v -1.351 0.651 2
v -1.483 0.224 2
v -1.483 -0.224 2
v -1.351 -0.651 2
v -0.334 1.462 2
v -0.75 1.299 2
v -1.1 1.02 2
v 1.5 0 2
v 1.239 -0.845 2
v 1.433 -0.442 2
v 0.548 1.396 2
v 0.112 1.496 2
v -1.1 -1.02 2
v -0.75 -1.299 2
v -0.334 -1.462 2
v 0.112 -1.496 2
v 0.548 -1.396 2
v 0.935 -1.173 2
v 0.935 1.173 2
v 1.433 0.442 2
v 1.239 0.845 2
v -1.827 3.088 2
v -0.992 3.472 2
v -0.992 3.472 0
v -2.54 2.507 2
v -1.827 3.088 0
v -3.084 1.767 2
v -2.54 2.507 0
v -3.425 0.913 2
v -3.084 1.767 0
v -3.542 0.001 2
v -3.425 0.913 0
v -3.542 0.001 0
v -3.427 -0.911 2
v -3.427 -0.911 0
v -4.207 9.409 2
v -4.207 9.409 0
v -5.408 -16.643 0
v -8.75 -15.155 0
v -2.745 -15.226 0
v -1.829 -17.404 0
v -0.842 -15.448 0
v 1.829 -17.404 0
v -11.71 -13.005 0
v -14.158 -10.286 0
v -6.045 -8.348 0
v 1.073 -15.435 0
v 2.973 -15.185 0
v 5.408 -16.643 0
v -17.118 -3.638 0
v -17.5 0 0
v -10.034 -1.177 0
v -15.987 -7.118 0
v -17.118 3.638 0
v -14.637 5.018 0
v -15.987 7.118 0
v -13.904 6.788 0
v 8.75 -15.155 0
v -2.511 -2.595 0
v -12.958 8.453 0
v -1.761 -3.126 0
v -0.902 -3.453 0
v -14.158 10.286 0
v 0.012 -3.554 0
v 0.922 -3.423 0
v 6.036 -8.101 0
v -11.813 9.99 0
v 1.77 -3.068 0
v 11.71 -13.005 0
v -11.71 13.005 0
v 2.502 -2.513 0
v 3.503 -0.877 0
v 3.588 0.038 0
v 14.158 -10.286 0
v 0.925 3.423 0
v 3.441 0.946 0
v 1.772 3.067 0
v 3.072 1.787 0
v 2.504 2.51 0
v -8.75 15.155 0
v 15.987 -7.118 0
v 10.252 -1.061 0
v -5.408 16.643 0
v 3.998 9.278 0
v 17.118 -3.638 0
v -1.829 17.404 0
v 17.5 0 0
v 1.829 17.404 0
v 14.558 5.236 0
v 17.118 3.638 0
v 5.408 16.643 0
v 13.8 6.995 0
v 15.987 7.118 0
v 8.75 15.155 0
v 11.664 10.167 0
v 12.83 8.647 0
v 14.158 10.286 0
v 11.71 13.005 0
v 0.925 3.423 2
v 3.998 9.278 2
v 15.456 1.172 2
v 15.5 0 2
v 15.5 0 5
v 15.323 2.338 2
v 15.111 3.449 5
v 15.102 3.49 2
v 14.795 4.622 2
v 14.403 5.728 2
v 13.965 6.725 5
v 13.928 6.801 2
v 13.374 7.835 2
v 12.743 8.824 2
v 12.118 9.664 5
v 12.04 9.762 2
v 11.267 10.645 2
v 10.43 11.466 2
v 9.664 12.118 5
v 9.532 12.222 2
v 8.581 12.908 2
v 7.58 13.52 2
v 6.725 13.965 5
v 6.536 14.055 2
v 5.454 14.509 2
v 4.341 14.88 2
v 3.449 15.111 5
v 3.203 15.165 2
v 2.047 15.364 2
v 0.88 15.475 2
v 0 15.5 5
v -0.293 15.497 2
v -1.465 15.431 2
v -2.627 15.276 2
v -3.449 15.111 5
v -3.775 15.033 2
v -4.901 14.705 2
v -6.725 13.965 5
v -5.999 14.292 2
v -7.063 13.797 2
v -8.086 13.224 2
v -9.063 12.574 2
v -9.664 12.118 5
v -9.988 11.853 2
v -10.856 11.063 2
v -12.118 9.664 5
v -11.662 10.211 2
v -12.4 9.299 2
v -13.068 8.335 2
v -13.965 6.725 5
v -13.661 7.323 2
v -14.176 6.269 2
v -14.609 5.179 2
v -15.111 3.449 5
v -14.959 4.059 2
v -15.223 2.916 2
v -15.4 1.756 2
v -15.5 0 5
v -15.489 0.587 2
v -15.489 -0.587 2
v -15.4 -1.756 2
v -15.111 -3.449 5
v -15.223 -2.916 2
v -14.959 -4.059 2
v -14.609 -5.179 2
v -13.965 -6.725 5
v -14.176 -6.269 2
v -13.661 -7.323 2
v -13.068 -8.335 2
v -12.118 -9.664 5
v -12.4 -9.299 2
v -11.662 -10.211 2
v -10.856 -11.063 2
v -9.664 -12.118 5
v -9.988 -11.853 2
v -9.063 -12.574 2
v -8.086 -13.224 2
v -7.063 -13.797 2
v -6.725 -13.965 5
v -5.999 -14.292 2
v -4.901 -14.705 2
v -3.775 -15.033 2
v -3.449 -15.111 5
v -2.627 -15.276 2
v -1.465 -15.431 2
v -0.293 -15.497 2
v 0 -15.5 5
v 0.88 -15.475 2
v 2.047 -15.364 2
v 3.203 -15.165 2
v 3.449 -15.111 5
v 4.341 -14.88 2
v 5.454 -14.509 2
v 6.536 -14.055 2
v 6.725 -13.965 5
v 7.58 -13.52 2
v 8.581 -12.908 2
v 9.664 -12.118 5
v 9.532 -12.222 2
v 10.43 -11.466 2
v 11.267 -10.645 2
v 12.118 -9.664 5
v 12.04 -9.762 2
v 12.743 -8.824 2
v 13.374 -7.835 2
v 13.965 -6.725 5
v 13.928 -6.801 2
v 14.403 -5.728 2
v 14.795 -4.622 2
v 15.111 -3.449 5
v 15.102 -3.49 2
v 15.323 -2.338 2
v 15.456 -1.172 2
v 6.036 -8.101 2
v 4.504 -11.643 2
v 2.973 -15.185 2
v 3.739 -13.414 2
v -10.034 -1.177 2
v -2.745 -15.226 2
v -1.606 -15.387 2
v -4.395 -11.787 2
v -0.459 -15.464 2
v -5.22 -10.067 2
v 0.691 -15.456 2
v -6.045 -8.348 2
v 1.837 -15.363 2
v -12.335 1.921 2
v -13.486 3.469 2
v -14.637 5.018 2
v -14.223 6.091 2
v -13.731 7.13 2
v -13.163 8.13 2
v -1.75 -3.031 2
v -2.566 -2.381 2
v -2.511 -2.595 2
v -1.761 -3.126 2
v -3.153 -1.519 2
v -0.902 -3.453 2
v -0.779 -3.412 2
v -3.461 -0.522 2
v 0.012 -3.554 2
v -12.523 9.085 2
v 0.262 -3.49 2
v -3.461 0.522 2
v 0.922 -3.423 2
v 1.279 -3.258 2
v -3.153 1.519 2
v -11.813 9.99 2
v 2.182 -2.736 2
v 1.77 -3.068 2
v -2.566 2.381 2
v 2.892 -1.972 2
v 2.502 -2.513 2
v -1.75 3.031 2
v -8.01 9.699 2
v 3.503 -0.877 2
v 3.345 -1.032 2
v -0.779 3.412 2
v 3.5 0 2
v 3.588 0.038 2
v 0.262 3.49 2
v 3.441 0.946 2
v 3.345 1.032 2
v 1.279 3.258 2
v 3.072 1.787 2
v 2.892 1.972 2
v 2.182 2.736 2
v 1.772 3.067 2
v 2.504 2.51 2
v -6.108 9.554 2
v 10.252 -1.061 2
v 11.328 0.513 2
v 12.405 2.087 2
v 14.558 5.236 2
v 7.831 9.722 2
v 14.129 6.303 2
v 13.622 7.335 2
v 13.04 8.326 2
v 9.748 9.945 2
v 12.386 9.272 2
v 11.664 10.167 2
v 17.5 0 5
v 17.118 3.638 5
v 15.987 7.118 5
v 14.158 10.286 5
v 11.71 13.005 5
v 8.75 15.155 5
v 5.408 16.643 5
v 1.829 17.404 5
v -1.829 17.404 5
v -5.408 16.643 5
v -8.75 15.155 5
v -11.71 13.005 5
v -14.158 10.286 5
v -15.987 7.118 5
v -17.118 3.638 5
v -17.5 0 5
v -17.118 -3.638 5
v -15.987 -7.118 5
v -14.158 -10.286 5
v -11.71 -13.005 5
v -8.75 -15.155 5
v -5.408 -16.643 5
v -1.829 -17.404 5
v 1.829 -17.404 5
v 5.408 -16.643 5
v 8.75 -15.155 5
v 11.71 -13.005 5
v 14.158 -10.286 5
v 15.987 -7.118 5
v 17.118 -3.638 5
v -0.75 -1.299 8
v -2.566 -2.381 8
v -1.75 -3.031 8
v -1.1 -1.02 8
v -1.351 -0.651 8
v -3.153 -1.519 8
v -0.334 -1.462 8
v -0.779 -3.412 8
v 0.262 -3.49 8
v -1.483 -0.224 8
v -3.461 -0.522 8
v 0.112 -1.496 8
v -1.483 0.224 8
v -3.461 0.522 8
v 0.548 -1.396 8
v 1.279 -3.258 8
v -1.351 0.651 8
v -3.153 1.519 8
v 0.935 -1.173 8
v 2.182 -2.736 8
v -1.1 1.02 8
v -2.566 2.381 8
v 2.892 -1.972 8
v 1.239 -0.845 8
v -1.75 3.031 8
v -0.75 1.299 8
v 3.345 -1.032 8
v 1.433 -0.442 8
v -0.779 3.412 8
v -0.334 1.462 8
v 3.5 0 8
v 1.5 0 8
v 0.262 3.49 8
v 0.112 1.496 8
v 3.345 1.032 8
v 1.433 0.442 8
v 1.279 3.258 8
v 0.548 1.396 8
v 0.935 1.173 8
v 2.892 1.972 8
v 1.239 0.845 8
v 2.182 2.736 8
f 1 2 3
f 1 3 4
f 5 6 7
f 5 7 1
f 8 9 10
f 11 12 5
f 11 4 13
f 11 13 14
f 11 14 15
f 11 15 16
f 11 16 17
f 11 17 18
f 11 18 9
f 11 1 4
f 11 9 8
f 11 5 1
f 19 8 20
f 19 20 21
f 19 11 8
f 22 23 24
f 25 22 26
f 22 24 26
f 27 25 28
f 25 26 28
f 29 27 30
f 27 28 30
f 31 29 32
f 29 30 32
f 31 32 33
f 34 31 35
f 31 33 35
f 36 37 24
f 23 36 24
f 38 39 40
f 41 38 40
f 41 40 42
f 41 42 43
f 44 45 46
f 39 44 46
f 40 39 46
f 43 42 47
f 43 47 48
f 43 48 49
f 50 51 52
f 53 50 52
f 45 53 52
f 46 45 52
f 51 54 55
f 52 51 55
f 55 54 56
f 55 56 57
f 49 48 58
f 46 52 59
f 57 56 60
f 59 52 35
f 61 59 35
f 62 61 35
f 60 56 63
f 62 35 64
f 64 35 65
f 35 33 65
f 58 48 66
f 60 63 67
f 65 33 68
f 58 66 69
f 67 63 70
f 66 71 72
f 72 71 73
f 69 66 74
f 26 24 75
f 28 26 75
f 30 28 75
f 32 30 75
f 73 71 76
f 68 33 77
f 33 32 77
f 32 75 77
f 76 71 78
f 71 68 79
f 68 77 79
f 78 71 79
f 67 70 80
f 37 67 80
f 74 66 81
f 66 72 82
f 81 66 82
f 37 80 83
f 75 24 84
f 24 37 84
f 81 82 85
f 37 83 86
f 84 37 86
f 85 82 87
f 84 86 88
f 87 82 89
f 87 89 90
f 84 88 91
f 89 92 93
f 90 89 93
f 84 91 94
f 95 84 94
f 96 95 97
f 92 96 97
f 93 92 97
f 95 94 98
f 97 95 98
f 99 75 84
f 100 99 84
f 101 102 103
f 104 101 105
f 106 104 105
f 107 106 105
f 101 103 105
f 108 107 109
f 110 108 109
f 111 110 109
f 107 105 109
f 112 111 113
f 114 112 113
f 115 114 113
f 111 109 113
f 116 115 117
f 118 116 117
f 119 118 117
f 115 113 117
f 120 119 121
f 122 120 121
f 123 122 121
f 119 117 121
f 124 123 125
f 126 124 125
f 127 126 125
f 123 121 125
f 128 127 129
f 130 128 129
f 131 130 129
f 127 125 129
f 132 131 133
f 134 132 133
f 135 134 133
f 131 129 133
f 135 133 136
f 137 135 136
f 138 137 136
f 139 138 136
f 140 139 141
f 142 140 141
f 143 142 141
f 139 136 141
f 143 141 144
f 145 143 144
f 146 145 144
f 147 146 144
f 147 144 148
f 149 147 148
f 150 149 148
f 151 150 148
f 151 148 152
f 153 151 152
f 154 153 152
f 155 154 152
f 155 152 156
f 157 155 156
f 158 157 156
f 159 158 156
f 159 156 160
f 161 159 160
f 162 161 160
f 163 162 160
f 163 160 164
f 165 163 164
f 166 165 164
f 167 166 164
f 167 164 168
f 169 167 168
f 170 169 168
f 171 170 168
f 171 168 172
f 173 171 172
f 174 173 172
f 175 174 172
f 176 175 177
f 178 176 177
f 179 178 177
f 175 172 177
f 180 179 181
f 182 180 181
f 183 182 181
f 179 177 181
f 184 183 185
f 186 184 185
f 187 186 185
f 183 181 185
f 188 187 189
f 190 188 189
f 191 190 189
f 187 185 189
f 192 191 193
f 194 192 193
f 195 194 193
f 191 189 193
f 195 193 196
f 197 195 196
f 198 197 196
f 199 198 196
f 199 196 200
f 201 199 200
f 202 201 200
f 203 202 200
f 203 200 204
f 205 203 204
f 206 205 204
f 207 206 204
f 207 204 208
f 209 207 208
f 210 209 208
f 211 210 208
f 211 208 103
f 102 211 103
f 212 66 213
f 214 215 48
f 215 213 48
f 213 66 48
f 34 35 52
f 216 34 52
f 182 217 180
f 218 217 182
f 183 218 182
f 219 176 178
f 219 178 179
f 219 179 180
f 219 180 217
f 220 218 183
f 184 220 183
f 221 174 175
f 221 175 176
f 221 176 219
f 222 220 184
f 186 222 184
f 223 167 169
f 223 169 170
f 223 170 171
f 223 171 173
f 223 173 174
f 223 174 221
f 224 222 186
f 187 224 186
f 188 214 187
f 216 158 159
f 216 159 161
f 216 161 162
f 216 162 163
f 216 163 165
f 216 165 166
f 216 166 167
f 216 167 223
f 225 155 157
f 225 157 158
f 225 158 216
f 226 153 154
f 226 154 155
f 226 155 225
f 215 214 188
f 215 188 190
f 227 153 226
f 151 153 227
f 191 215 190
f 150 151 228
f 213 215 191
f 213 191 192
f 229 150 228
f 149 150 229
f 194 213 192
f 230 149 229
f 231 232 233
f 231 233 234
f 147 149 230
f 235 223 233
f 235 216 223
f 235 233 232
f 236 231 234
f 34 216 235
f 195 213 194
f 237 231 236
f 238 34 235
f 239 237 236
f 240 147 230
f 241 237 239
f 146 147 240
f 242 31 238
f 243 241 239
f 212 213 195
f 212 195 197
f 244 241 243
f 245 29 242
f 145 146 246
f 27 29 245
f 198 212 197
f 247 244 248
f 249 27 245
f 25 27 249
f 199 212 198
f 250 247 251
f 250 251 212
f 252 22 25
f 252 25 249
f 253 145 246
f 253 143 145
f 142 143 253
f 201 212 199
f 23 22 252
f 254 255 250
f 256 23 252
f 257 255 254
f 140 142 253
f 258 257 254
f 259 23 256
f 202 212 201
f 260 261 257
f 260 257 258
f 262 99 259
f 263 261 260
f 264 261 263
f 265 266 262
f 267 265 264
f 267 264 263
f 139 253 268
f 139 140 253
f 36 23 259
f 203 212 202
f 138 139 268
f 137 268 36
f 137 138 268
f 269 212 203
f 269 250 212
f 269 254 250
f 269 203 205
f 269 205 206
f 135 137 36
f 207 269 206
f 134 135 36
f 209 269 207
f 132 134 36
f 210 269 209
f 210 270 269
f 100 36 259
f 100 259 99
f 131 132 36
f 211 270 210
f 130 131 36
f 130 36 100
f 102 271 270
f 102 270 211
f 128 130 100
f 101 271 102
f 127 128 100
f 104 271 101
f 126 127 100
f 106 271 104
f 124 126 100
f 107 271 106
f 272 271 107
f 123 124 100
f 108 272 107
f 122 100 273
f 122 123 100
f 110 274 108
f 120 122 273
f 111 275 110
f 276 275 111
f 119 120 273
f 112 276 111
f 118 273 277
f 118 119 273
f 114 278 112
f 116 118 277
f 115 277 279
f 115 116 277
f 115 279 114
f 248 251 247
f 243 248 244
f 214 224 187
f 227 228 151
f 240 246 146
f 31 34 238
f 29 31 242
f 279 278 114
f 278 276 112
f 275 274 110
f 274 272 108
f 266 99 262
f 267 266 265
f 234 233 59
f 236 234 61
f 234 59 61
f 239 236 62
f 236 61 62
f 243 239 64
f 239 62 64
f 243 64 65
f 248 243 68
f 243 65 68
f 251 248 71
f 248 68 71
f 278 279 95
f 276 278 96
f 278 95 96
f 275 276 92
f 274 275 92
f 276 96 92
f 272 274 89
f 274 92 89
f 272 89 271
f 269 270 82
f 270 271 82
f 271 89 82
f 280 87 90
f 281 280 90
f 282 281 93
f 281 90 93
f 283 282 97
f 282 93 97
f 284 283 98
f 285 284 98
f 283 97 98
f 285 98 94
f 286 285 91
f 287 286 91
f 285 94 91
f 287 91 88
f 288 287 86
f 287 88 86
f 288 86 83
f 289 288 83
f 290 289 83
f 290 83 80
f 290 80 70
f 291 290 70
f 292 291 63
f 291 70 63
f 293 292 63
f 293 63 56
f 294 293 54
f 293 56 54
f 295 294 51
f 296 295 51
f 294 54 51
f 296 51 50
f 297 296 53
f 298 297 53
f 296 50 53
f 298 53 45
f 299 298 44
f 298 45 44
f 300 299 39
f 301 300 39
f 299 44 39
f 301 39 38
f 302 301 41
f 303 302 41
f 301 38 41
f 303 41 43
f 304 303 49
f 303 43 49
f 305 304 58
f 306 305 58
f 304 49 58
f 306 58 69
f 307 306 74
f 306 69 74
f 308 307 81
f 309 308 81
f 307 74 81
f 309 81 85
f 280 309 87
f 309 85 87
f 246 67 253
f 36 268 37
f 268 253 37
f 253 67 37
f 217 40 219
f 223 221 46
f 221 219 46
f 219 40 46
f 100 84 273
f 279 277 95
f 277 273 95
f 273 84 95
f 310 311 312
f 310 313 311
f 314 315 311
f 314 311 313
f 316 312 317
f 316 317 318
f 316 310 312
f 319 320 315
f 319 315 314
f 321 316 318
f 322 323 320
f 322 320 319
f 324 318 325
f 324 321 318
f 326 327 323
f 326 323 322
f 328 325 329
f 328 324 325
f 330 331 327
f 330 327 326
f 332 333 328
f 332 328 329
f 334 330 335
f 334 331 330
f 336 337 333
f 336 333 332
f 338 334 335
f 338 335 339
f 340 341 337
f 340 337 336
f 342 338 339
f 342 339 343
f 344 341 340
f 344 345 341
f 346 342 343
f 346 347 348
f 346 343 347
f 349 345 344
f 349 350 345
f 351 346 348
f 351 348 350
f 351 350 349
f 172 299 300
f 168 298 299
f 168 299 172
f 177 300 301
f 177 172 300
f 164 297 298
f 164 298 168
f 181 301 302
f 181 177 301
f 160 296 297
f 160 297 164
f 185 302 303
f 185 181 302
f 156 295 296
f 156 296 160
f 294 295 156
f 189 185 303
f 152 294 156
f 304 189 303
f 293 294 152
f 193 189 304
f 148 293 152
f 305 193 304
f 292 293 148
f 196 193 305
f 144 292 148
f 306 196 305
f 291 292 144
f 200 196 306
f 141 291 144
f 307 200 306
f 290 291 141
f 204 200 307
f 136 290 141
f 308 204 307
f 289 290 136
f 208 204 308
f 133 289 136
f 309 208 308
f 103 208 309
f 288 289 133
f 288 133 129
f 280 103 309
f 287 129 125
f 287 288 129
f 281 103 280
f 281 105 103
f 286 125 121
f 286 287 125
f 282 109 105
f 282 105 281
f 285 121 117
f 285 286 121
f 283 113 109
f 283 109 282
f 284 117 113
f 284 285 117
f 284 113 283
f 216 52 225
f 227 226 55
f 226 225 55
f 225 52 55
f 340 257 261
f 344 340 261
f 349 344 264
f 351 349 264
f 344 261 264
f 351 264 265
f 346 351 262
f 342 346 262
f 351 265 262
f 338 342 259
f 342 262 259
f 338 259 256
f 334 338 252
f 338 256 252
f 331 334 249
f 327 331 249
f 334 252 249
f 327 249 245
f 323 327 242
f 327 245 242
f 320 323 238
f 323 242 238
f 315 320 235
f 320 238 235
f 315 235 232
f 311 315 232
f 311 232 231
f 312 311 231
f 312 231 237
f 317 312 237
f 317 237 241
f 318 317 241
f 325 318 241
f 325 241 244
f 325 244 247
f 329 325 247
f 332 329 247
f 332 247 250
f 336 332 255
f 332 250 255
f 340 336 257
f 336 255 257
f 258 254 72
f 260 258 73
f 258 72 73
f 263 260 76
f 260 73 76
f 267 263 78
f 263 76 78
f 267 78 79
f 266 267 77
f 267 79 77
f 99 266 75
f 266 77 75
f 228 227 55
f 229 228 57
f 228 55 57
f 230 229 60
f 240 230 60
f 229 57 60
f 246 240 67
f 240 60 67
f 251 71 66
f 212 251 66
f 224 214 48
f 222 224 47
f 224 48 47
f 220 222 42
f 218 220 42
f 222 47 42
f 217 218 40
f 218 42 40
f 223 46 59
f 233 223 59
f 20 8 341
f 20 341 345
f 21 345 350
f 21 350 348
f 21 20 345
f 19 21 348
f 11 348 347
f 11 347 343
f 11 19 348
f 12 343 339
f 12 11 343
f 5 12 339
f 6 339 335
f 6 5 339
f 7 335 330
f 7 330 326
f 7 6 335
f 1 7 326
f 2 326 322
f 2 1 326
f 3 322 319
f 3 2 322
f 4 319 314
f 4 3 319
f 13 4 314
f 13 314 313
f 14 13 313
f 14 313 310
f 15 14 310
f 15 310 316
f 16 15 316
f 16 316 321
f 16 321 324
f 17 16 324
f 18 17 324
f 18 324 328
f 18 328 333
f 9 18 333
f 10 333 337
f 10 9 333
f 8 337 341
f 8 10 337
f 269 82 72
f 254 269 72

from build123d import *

# Parameters (mm, degrees)
F0_R     = 17.5
F1_DEPTH = 5
F2_R     = 15.5
F3_DEPTH = 3
F4_R     = 3.5
F4_R_2   = 1.5
F5_DEPTH = 6
F8_DEPTH = 25


with BuildPart() as f1:
    # F0 (on Top) → F1 (new body)
    with BuildSketch(Plane.XY):
        Circle(F0_R)
    extrude(amount=F1_DEPTH)

    # F2 (on face) → F3 (cut)
    with BuildSketch(Plane.XY.offset(5)):
        Circle(F2_R)
    extrude(amount=-F3_DEPTH, mode=Mode.SUBTRACT)

    # F4 (on face) → F5 (join)
    with BuildSketch(Plane.XY.offset(2)):
        Circle(F4_R)
        Circle(F4_R_2, mode=Mode.SUBTRACT)
    extrude(amount=F5_DEPTH)

    # F7 (on face) → F8 (cut)
    with BuildSketch(Plane(origin=(0, 0, 0), x_dir=(1, 0, 0), z_dir=(0, 0, -1))):
        with BuildLine():
            ThreePointArc((-2.510914, 2.59477), (0.012059, 3.554075), (2.502232, 2.512588))
            Line((2.502232, 2.512588), (6.036088, 8.101013))
            Line((6.036088, 8.101013), (2.972662, 15.185164))
            ThreePointArc((2.972662, 15.185164), (0.115894, 15.47105), (-2.744629, 15.22557))
            Line((-2.744629, 15.22557), (-6.044772, 8.347561))
            Line((-6.044772, 8.347561), (-2.510914, 2.59477))
        make_face()
        with BuildLine():
            Line((-3.427081, 0.910703), (-10.033727, 1.1769))
            Line((-10.033727, 1.1769), (-14.637069, -5.018181))
            ThreePointArc((-14.637069, -5.018181), (-13.456269, -7.635157), (-11.813416, -9.989703))
            Line((-11.813416, -9.989703), (-4.206814, -9.408706))
            Line((-4.206814, -9.408706), (-0.99168, -3.471901))
            ThreePointArc((-0.99168, -3.471901), (-3.083949, -1.766595), (-3.427081, 0.910703))
        make_face()
        with BuildLine():
            Line((0.924849, -3.423291), (3.997639, -9.277912))
            Line((3.997639, -9.277912), (11.664407, -10.166983))
            ThreePointArc((11.664407, -10.166983), (13.340375, -7.835892), (14.558044, -5.235867))
            Line((14.558044, -5.235867), (10.251585, 1.061145))
            Line((10.251585, 1.061145), (3.502594, 0.87713))
            ThreePointArc((3.502594, 0.87713), (3.07189, -1.787481), (0.924849, -3.423291))
        make_face()
    extrude(amount=-F8_DEPTH, mode=Mode.SUBTRACT)


solid = f1.part
